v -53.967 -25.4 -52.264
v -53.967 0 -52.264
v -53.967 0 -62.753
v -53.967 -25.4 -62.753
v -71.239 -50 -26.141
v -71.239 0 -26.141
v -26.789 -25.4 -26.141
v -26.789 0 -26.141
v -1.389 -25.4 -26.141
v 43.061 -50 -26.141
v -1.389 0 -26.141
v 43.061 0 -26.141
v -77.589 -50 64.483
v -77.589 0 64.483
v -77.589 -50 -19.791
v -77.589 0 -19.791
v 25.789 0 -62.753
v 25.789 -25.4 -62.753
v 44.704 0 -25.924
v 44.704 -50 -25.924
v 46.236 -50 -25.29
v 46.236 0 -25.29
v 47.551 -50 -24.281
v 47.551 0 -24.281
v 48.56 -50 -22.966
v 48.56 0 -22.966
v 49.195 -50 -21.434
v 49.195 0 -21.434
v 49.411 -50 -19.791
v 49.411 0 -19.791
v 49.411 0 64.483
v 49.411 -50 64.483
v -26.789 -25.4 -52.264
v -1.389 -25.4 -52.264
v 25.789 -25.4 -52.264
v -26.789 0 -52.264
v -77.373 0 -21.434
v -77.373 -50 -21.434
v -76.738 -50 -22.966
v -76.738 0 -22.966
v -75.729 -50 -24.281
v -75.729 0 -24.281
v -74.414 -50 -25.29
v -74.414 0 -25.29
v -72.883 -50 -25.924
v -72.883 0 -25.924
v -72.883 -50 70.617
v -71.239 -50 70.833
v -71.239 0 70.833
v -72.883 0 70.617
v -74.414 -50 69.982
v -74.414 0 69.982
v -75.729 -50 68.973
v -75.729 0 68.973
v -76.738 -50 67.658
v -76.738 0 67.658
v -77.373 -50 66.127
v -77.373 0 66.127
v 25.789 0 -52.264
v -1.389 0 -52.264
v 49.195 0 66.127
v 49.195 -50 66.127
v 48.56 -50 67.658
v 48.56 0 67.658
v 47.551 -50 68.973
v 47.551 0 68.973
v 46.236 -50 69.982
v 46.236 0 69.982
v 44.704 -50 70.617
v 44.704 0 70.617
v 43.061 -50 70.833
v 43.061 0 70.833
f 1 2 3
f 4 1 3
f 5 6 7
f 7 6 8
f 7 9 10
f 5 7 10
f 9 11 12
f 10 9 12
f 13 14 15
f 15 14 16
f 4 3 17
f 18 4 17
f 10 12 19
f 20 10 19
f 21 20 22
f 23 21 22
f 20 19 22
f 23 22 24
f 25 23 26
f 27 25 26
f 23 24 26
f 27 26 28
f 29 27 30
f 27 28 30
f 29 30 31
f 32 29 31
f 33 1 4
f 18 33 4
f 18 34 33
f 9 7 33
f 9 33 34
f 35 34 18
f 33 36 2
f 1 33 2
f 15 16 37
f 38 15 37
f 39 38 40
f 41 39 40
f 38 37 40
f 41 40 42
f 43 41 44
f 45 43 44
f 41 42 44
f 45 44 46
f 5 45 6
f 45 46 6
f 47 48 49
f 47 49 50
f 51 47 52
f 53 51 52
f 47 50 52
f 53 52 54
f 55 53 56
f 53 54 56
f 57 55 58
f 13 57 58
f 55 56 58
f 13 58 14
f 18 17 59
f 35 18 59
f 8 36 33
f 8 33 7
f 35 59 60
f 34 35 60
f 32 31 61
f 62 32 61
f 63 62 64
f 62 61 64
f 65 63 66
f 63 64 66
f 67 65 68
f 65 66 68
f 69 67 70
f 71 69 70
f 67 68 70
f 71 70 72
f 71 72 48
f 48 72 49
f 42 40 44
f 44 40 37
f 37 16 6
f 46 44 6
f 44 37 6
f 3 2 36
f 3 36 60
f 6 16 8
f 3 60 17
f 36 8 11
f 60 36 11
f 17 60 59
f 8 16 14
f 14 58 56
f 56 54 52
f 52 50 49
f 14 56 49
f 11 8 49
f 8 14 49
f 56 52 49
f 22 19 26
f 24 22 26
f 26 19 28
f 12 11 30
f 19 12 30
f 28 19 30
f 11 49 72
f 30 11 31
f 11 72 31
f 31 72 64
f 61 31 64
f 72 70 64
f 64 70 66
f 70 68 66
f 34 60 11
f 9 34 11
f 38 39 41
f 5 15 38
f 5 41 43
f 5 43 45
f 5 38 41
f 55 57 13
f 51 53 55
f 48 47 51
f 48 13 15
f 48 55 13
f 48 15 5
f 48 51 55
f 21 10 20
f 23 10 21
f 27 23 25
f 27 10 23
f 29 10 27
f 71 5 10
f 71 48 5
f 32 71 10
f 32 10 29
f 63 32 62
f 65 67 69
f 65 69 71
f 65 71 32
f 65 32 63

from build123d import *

# Parameters (mm, degrees)
F1_DEPTH = 50
F0_W     = 25.4
F0_H     = 26.123554
F2_DEPTH = 25.4


with BuildPart() as f1:
    # F0 (on Front) → F1 (new body)
    with BuildSketch(Plane.XZ):
        with BuildLine():
            Line((43.060917, 70.833095), (-71.239083, 70.833095))
            ThreePointArc((-71.239083, 70.833095), (-75.729211, 68.973223), (-77.589083, 64.483095))
            Line((-77.589083, 64.483095), (-77.589083, -19.790707))
            ThreePointArc((-77.589083, -19.790707), (-75.729211, -24.280835), (-71.239083, -26.140707))
            Line((-71.239083, -26.140707), (-26.789083, -26.140707))
            Line((-26.789083, -26.140707), (-1.389083, -26.140707))
            Line((-1.389083, -26.140707), (43.060917, -26.140707))
            ThreePointArc((43.060917, -26.140707), (47.551045, -24.280835), (49.410917, -19.790707))
            Line((49.410917, -19.790707), (49.410917, 64.483095))
            ThreePointArc((49.410917, 64.483095), (47.551045, 68.973223), (43.060917, 70.833095))
        make_face()
    extrude(amount=F1_DEPTH)

    # F0 (on Front) → F2 (join)
    with BuildSketch(Plane.XZ):
        with BuildLine():
            Line((43.060917, 70.833095), (-71.239083, 70.833095))
            ThreePointArc((-71.239083, 70.833095), (-75.729211, 68.973223), (-77.589083, 64.483095))
            Line((-77.589083, 64.483095), (-77.589083, -19.790707))
            ThreePointArc((-77.589083, -19.790707), (-75.729211, -24.280835), (-71.239083, -26.140707))
            Line((-71.239083, -26.140707), (-26.789083, -26.140707))
            Line((-26.789083, -26.140707), (-1.389083, -26.140707))
            Line((-1.389083, -26.140707), (43.060917, -26.140707))
            ThreePointArc((43.060917, -26.140707), (47.551045, -24.280835), (49.410917, -19.790707))
            Line((49.410917, -19.790707), (49.410917, 64.483095))
            ThreePointArc((49.410917, 64.483095), (47.551045, 68.973223), (43.060917, 70.833095))
        make_face()
        with Locations((-14.089083, -39.202484)):
            Rectangle(F0_W, F0_H)
        Polygon((-1.389083, -52.264261), (-26.789083, -52.264261), (-53.967083, -52.264261), (-53.967083, -62.753261), (25.788917, -62.753261), (25.788917, -52.264261), align=None)
    extrude(amount=F2_DEPTH)


solid = f1.part
